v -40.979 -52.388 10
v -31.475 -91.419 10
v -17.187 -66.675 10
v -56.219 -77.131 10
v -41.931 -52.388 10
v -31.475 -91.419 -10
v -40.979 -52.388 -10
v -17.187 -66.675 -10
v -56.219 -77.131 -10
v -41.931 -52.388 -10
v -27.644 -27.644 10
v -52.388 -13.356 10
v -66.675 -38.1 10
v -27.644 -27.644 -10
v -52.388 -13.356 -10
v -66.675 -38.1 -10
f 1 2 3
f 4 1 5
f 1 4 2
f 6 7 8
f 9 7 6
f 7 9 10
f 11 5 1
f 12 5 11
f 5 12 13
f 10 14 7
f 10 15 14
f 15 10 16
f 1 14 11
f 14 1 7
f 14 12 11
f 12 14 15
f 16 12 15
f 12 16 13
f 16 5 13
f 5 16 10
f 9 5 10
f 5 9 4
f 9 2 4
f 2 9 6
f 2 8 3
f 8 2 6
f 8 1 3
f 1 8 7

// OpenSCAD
scale([-1,1,1]) polyhedron(
    points=[
    [40.9786666666667, -52.3875, 10],
    [27.6436666666667, -27.6436666666667, 10],
    [52.3875, -13.3561666666667, 10],
    [66.675, -38.1, 10],
    [41.9311666666667, -52.3875, 10],
    [56.2186666666667, -77.1313333333333, 10],
    [31.4748333333333, -91.4188333333333, 10],
    [17.1873333333333, -66.675, 10],
    [40.9786666666667, -52.3875, -10],
    [27.6436666666667, -27.6436666666667, -10],
    [52.3875, -13.3561666666667, -10],
    [66.675, -38.1, -10],
    [41.9311666666667, -52.3875, -10],
    [56.2186666666667, -77.1313333333333, -10],
    [31.4748333333333, -91.4188333333333, -10],
    [17.1873333333333, -66.675, -10],
    ],
    faces=[
        [4,5,6,7,0],
        [8,15,14,13,12],
        [0,1,2,3,4],
        [12,11,10,9,8],
        [0,8,9,1],
        [1,9,10,2],
        [2,10,11,3],
        [3,11,12,4],
        [4,12,13,5],
        [5,13,14,6],
        [6,14,15,7],
        [7,15,8,0],
    ]
);
